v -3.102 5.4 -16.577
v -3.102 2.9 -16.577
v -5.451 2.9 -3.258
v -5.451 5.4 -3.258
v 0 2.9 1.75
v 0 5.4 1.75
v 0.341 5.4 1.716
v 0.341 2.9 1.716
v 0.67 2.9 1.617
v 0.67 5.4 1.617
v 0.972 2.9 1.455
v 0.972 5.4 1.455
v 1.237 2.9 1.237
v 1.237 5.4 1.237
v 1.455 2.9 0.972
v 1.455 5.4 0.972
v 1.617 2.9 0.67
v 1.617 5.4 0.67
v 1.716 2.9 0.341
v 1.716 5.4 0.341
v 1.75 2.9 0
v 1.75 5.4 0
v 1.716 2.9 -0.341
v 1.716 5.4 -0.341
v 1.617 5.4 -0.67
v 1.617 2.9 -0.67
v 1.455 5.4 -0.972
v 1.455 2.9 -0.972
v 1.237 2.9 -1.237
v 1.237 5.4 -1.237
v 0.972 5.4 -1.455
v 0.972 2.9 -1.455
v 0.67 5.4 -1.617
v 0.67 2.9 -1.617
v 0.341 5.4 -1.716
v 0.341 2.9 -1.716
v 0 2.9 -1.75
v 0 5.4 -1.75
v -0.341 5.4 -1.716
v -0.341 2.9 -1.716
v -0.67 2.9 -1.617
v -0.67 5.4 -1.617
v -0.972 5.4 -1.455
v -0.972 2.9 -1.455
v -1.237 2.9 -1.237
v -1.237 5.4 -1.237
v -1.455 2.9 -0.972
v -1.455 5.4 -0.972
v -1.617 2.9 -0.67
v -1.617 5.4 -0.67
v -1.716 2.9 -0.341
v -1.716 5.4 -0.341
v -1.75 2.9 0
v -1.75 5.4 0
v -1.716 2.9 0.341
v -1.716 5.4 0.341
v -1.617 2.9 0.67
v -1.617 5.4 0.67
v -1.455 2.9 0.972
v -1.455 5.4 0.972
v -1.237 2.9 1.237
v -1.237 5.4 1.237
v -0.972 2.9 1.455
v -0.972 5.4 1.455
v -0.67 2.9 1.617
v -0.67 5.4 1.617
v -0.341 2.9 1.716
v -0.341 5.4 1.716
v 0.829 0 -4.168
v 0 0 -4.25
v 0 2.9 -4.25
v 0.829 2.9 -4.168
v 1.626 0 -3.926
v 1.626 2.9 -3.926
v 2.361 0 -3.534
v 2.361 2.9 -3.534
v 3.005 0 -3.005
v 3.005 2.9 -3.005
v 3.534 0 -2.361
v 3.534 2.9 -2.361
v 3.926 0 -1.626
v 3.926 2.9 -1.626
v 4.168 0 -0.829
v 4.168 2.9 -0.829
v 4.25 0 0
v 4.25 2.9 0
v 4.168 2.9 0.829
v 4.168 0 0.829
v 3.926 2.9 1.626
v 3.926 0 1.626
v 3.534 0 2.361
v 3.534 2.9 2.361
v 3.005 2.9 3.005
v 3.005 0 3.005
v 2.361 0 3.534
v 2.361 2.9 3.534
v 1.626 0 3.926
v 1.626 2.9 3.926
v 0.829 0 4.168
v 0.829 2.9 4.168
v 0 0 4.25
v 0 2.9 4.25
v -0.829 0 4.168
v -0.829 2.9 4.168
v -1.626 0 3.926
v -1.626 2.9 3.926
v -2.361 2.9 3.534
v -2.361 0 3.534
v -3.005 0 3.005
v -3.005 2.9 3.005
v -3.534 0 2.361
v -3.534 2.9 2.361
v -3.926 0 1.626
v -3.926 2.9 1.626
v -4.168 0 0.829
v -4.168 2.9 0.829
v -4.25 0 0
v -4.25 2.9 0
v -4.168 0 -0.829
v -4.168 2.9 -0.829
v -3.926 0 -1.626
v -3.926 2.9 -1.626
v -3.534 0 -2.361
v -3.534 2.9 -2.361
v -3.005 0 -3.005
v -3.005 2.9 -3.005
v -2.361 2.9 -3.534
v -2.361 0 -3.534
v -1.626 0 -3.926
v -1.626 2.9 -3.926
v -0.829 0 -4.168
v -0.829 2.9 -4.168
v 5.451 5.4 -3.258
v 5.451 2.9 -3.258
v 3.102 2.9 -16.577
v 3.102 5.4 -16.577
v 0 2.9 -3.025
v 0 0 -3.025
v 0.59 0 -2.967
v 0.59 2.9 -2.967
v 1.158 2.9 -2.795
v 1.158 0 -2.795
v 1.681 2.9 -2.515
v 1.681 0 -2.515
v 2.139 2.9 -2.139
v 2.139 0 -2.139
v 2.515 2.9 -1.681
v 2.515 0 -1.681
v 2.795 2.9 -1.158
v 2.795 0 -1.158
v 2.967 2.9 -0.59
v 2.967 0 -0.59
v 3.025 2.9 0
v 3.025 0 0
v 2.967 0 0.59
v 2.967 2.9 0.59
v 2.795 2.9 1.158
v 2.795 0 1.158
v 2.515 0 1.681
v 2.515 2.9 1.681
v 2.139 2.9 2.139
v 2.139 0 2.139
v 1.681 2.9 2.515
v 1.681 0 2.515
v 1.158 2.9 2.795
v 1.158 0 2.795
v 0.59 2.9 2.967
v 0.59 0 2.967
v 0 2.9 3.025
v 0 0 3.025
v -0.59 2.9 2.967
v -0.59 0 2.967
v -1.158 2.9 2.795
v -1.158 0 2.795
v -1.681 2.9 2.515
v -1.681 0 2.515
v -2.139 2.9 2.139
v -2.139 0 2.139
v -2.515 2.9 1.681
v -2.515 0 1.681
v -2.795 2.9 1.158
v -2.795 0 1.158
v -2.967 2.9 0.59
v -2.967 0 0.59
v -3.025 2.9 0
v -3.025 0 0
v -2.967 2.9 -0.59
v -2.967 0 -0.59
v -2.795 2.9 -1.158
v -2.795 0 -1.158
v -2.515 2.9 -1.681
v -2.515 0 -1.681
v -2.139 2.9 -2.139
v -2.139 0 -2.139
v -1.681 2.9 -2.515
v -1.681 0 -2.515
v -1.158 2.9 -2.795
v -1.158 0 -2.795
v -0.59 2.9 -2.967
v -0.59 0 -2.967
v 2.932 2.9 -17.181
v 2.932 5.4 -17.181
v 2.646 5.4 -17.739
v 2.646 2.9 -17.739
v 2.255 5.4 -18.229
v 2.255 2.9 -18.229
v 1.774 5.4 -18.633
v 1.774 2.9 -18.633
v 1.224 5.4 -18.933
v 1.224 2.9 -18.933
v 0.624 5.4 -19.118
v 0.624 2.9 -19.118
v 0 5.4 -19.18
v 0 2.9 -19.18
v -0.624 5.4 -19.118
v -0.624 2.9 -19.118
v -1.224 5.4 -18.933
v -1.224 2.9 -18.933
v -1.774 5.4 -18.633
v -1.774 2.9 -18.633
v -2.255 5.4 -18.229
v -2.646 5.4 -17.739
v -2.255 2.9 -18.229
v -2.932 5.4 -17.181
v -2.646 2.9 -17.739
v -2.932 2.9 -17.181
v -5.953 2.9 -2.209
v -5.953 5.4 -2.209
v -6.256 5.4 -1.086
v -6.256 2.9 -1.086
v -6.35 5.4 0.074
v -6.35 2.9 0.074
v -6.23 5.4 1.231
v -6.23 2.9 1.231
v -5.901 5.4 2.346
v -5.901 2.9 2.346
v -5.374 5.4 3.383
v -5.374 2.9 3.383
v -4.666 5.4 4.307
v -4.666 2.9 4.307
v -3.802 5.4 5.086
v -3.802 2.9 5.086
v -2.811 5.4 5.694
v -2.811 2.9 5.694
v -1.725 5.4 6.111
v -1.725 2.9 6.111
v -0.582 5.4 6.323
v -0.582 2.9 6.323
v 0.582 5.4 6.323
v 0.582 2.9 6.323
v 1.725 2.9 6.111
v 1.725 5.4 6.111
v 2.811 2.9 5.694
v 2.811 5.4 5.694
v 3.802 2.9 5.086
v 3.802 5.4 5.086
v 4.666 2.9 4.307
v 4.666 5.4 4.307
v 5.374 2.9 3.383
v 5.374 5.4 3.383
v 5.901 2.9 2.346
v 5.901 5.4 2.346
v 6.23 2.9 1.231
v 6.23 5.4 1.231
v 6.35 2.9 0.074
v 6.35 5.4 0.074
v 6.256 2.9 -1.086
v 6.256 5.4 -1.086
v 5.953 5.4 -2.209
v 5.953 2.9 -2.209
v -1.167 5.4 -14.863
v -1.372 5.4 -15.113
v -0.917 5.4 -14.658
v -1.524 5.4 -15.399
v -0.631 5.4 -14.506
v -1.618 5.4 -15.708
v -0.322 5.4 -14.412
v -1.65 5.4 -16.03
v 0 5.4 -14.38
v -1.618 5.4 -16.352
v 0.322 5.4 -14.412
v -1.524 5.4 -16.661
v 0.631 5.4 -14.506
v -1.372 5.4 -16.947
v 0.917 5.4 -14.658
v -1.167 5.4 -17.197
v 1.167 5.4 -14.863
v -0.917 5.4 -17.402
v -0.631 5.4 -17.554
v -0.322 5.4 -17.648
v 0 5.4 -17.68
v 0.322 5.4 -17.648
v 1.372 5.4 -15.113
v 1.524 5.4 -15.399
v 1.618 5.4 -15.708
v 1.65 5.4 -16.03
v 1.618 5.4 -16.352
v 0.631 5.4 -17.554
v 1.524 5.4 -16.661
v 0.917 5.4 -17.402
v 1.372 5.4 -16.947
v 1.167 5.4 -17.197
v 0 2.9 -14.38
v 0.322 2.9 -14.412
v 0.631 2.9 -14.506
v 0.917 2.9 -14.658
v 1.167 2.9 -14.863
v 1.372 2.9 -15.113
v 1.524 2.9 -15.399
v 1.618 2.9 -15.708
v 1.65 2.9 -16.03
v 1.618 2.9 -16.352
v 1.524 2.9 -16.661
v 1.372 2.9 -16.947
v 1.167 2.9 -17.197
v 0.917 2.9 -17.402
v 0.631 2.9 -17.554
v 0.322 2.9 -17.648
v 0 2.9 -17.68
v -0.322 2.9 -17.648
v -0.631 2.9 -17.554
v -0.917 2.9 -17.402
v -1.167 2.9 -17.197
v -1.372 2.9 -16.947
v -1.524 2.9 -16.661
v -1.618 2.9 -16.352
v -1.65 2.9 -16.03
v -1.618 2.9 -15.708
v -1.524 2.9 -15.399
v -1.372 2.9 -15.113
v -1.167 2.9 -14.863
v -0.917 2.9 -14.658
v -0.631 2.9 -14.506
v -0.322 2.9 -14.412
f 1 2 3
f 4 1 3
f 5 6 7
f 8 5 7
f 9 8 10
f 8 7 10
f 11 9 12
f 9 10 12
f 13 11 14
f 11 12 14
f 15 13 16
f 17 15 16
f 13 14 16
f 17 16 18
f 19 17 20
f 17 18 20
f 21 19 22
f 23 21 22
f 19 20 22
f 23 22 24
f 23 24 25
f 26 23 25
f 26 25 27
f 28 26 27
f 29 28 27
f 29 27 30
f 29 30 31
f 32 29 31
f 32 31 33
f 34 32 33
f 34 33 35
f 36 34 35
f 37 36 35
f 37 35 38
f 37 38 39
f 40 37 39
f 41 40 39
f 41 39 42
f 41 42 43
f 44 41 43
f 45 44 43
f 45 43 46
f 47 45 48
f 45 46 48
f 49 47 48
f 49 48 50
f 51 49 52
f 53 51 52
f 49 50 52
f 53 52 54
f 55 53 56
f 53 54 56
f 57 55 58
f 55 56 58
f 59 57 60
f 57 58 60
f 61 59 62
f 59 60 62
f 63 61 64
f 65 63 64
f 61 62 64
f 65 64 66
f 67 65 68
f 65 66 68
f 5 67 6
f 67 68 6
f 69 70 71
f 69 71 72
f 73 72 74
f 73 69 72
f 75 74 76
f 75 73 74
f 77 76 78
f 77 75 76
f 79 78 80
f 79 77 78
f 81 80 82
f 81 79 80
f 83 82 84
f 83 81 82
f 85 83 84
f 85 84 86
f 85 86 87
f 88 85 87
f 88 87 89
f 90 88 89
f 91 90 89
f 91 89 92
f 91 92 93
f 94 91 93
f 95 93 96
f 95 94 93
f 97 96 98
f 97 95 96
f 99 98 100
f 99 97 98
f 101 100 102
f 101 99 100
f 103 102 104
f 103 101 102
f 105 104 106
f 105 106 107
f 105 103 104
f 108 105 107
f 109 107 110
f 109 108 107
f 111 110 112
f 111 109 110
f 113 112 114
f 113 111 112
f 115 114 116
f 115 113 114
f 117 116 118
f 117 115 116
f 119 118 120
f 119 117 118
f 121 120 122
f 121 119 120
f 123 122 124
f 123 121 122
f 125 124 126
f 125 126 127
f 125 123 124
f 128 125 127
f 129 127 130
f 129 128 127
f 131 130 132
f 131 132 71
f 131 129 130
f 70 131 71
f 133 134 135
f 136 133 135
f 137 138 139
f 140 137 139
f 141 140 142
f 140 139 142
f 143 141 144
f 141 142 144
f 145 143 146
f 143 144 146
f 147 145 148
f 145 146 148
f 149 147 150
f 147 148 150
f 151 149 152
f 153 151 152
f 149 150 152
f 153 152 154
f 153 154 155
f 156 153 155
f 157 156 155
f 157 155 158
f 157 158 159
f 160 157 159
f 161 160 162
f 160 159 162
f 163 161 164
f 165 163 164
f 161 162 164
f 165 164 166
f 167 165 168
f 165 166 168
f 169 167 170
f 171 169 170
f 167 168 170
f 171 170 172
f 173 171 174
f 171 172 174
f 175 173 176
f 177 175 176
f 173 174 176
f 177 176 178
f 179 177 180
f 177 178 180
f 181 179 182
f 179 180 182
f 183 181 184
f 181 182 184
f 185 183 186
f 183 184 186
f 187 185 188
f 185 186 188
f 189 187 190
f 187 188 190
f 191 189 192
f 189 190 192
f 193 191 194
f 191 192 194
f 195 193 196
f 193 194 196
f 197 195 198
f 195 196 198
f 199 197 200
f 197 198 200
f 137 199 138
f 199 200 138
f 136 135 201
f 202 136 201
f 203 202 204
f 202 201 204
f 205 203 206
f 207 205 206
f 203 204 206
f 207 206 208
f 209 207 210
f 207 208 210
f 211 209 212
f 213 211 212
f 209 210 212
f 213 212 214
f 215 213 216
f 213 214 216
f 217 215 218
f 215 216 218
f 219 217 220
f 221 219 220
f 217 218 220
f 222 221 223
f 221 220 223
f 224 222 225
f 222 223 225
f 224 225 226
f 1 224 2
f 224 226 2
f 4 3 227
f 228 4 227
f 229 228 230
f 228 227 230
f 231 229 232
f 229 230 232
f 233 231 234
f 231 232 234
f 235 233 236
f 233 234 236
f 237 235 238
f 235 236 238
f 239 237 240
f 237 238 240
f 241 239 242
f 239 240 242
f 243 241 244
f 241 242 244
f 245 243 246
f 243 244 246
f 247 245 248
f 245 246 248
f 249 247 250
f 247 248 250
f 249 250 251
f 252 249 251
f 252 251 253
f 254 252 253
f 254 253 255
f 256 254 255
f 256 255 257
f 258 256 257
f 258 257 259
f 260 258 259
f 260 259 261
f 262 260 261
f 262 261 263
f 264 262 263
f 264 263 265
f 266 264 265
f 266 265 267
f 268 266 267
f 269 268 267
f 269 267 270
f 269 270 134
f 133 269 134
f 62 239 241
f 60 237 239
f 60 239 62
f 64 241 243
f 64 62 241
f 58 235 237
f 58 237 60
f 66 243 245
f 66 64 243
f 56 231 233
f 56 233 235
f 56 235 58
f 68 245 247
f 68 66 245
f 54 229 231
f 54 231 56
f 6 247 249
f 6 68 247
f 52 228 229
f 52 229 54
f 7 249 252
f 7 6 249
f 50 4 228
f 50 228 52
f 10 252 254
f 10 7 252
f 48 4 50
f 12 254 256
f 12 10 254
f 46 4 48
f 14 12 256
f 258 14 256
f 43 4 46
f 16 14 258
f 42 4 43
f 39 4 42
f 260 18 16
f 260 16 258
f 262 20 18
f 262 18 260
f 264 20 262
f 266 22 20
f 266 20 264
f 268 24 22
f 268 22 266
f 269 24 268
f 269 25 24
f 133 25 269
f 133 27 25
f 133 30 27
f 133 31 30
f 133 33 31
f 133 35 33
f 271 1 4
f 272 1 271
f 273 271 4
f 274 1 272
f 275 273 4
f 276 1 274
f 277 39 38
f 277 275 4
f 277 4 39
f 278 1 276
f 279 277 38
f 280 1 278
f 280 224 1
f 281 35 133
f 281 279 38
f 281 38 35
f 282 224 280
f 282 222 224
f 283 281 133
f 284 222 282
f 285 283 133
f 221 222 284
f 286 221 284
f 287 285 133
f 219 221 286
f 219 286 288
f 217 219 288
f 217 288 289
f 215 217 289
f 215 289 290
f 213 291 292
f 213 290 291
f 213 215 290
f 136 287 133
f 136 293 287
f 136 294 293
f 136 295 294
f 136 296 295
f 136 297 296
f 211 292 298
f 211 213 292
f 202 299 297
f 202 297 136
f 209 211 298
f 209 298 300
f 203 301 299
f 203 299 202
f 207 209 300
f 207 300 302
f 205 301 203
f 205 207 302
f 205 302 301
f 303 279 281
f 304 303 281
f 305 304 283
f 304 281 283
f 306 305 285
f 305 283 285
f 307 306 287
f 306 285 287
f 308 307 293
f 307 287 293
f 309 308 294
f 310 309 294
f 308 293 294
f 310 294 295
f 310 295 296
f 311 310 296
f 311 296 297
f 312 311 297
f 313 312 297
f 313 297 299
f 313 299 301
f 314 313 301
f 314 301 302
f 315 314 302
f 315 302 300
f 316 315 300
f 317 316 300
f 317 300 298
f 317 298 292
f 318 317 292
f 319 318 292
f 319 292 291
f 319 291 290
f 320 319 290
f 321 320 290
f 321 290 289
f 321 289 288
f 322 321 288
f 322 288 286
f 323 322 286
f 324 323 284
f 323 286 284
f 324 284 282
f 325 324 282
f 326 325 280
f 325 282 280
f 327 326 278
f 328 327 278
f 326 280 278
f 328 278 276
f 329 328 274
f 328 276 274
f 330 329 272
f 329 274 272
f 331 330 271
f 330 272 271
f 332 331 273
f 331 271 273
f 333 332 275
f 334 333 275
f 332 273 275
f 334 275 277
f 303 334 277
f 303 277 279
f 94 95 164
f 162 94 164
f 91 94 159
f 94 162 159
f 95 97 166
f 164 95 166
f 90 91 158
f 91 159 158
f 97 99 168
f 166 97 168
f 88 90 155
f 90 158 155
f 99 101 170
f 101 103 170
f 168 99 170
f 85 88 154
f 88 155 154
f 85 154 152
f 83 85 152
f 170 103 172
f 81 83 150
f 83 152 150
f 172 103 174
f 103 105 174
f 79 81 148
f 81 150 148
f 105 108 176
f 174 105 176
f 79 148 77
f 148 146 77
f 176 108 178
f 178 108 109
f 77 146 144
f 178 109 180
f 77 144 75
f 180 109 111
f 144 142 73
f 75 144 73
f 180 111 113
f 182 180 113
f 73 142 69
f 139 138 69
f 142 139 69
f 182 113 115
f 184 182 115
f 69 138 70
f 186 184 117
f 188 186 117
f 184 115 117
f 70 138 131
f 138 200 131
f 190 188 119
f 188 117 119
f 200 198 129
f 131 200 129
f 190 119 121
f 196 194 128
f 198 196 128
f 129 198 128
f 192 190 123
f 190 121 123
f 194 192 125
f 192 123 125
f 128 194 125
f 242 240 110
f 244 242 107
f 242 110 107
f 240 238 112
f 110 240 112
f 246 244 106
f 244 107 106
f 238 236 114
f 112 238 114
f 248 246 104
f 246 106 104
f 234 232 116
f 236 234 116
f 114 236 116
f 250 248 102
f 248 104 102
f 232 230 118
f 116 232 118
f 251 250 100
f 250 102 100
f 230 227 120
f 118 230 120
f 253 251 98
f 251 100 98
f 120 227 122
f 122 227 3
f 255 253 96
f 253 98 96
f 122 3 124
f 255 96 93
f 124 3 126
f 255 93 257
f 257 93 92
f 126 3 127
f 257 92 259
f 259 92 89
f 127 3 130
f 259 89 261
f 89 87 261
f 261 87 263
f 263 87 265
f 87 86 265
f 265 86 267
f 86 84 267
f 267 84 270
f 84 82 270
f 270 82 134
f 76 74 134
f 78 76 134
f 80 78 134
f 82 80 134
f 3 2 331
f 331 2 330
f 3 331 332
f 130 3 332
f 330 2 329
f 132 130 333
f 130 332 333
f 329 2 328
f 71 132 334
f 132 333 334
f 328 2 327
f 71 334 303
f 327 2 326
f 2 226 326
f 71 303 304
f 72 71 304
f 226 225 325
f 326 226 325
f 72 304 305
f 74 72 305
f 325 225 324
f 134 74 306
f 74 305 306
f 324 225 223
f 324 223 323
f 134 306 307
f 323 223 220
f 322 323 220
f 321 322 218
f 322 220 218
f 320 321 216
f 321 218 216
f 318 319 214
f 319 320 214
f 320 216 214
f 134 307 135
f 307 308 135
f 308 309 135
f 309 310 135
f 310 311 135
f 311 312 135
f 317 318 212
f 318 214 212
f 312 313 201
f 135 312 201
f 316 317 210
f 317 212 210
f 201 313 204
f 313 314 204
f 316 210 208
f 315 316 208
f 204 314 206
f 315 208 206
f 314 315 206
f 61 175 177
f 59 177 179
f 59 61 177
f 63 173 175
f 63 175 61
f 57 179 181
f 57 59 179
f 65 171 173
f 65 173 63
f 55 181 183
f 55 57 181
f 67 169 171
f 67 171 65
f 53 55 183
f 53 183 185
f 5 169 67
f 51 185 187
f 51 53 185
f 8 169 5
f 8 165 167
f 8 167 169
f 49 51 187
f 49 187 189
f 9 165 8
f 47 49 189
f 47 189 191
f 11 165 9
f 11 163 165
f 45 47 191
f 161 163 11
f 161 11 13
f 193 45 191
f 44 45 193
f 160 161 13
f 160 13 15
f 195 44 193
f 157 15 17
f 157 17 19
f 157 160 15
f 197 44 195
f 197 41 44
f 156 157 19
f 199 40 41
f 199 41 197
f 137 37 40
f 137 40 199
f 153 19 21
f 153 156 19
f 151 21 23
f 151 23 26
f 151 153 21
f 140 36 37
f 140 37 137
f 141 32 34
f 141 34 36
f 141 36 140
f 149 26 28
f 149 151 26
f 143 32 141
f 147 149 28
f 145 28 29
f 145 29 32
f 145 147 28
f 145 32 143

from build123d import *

# Parameters (mm, degrees)
BASES_R             = 6.35
BASE_DEPTH          = 5.4
TOPBORES_R          = 1.75
TOP_BORE_DEPTH      = 11.478788098
HORN_START          = -2.5
HORN_HALF_DEPTH     = 2.5
HORNATTACHS_R       = 1.65
HORN_ATTACH_DEPTH   = 21.913031822
HOLDINGSHAFTS_R     = 6.35
HOLDINGSHAFTS_R_2   = 4.25
HOLDING_SHAFT_DEPTH = 2.9
SKETCH3_R           = 3.025
CUT_EXTRUDE2_DEPTH  = 2.9


with BuildPart() as part:
    # BaseS → BASE (new body)
    with BuildSketch(Plane(origin=(0, 0, 0), x_dir=(1, 0, 0), z_dir=(0, 1, 0))):
        with Locations(Location((0, 0, 0), (0, 0, 90))):
            Circle(BASES_R)
    extrude(amount=BASE_DEPTH)

    # TopBoreS → TOP BORE (cut, through all)
    with BuildSketch(Plane(origin=(0, 5.4, 0), x_dir=(1, 0, 0), z_dir=(0, 1, 0))):
        with Locations(Location((0, 0, 0), (0, 0, 270))):
            Circle(TOPBORES_R)
    extrude(amount=-TOP_BORE_DEPTH, mode=Mode.SUBTRACT)

    # HornHalfS → HORN HALF (add)
    with BuildSketch(Plane(origin=(0, 5.4, 0), x_dir=(1, 0, 0), z_dir=(0, 1, 0)).offset(HORN_START)):
        with BuildLine():
            Line((-3.102144422, 16.57699176), (-5.450702003, 3.257659846))
            ThreePointArc((-5.450702003, 3.257659846), (0, 6.35), (5.450702003, 3.257659846))
            Line((5.450702003, 3.257659846), (3.102144422, 16.57699176))
            ThreePointArc((3.102144422, 16.57699176), (0, 19.18), (-3.102144422, 16.57699176))
        make_face()
    extrude(amount=HORN_HALF_DEPTH)

    # HornAttachS → HORN ATTACH (cut, through all)
    with BuildSketch(Plane(origin=(0, 5.4, 0), x_dir=(1, 0, 0), z_dir=(0, 1, 0))):
        with Locations(Location((0, 16.03, 0), (0, 0, 270))):
            Circle(HORNATTACHS_R)
    extrude(amount=-HORN_ATTACH_DEPTH, mode=Mode.SUBTRACT)

    # HoldingShaftS → HOLDING SHAFT (cut)
    with BuildSketch(Plane.XZ):
        Circle(HOLDINGSHAFTS_R)
        with Locations(Location((0, 0, 0), (0, 0, 270))):
            Circle(HOLDINGSHAFTS_R_2, mode=Mode.SUBTRACT)
    extrude(amount=-HOLDING_SHAFT_DEPTH, mode=Mode.SUBTRACT)

    # Sketch3 → Cut-Extrude2 (cut)
    with BuildSketch(Plane.XZ):
        with Locations(Location((0, 0, 0), (0, 0, 270))):
            Circle(SKETCH3_R)
    extrude(amount=-CUT_EXTRUDE2_DEPTH, mode=Mode.SUBTRACT)


solid = part.part
